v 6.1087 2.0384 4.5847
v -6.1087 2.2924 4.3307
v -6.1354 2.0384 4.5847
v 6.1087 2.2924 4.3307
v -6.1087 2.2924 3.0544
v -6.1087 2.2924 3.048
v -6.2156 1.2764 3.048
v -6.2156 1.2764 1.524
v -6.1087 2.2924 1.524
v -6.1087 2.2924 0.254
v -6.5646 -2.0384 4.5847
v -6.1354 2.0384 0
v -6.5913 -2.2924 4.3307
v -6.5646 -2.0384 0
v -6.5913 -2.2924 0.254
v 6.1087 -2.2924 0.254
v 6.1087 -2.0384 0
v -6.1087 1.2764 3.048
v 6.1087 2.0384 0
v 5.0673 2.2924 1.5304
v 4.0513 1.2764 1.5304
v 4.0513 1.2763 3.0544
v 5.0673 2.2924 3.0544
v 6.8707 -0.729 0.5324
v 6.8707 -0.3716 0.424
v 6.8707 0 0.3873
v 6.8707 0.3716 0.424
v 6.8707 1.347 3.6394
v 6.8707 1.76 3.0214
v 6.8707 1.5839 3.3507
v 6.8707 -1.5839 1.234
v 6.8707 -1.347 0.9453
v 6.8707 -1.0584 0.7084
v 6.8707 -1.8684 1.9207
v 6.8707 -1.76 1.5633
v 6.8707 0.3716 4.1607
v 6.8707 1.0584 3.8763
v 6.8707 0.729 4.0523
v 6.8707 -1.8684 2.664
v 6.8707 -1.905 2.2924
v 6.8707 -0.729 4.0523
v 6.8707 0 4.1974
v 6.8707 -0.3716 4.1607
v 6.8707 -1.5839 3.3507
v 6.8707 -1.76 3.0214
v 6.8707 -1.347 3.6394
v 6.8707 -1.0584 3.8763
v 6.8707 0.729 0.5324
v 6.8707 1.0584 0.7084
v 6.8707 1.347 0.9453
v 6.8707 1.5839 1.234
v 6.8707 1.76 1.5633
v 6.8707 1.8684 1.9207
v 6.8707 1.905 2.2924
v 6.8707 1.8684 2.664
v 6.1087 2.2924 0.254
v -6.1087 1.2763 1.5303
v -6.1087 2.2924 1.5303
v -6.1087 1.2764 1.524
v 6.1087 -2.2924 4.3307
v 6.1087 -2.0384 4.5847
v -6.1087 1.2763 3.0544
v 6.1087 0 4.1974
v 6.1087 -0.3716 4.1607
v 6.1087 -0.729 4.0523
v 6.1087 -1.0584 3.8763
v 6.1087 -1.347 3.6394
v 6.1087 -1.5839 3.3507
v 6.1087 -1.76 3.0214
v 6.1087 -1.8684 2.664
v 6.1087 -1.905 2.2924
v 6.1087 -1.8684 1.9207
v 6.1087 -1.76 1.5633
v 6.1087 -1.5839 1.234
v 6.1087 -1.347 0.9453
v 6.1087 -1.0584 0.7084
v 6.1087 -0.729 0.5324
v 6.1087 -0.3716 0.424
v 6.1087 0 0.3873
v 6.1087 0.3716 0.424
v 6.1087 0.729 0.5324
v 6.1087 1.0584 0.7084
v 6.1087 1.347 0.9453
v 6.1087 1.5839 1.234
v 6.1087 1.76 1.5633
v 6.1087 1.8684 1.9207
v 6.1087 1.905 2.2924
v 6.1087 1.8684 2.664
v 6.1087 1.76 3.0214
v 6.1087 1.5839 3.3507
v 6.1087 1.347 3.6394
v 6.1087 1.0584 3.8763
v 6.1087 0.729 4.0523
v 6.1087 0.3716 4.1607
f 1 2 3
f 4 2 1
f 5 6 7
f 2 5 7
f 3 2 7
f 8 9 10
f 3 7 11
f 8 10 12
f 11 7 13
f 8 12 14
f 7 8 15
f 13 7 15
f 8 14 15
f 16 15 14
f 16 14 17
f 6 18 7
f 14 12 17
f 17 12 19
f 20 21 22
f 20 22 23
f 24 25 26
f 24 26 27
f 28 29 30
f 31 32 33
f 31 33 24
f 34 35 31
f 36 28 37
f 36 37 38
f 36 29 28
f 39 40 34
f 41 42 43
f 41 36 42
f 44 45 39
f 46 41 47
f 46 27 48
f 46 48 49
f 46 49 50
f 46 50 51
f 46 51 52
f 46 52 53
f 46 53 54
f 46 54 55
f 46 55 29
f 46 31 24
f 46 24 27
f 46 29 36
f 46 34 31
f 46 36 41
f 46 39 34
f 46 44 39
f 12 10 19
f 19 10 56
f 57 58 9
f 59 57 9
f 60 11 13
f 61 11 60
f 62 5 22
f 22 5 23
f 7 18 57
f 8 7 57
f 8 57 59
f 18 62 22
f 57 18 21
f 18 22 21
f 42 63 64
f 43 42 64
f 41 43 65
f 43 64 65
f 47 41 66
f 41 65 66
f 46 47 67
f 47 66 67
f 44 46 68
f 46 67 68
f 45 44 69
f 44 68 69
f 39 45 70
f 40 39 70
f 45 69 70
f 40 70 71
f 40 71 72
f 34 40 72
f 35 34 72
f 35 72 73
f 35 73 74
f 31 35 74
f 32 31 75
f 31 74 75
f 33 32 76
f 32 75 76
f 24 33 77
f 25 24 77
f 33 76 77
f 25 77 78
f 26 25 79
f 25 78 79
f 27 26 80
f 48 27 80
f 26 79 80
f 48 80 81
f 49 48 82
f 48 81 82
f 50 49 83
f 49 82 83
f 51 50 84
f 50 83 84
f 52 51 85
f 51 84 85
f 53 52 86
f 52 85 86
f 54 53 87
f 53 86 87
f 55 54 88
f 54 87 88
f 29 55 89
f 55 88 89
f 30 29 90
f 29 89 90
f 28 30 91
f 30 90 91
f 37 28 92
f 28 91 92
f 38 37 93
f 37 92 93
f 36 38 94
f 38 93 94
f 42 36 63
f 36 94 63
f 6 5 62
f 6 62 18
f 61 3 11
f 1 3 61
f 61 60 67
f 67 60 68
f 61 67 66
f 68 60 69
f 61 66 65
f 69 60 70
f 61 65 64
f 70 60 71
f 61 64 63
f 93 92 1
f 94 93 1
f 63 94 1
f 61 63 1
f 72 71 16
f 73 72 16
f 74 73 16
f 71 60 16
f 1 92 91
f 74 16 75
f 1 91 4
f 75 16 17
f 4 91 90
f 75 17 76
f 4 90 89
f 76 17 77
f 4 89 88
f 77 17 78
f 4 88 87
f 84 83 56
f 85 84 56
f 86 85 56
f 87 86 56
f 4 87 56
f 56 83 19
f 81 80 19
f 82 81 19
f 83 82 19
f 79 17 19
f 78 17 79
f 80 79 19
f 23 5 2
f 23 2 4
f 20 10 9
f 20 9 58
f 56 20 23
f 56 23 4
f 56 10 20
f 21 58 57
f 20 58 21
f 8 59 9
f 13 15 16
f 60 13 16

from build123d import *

# Parameters (mm, degrees)
SKETCH1_W           = 12.2174
SKETCH1_H           = 4.5847
BOSS_EXTRUDE1_DEPTH = 4.5847
SKETCH2_W           = 11.176
SKETCH2_H           = 1.524
CUT_EXTRUDE1_DEPTH  = 1.016
SKETCH4_W           = 1.524
SKETCH4_H           = 1.016
CUT_EXTRUDE3_DEPTH  = 14.249120928
SKETCH5_R           = 1.905
BOSS_EXTRUDE3_DEPTH = 0.762
CHAMFER1_SIZE       = 0.254
BOSS_EXTRUDE4_REACH = 9.861


with BuildPart() as part:
    # Sketch1 → Boss-Extrude1 (new body)
    with BuildSketch(Plane.XY):
        Polygon((-6.1087, 2.29235), (-6.5913, -2.29235), (-6.1087, -2.29235), align=None)
        Rectangle(SKETCH1_W, SKETCH1_H)
    extrude(amount=BOSS_EXTRUDE1_DEPTH)

    # Sketch2 → Cut-Extrude1 (cut)
    with BuildSketch(Plane(origin=(0, 2.29235, 0), x_dir=(1, 0, 0), z_dir=(0, 1, 0))):
        with Locations((-0.5207, -2.29235)):
            Rectangle(SKETCH2_W, SKETCH2_H)
    extrude(amount=-CUT_EXTRUDE1_DEPTH, mode=Mode.SUBTRACT)

    # Sketch4 → Cut-Extrude3 (cut, through all)
    with BuildSketch(Plane(origin=(-6.1087, 0, 0), x_dir=(0, 0, -1), z_dir=(1, 0, 0))):
        with Locations((-2.286, 1.78435)):
            Rectangle(SKETCH4_W, SKETCH4_H)
    extrude(amount=-CUT_EXTRUDE3_DEPTH, mode=Mode.SUBTRACT)

    # Sketch5 → Boss-Extrude3 (add)
    with BuildSketch(Plane(origin=(6.1087, 0, 0), x_dir=(0, 0, -1), z_dir=(1, 0, 0))):
        with Locations(Location((-2.29235, 0, 0), (0, 0, 180))):
            Circle(SKETCH5_R)
    extrude(amount=BOSS_EXTRUDE3_DEPTH)

    # Chamfer1
    chamfer1_edges = [part.edges().sort_by_distance(p)[0] for p in [
        (-0.2413, -2.29235, 4.5847),
        (0, 2.29235, 4.5847),
        (0, 2.29235, 0),
        (-0.2413, -2.29235, 0),
    ]]
    chamfer(chamfer1_edges, length=CHAMFER1_SIZE)

    # Sketch6 → Boss-Extrude4 (add, up to next)
    with BuildSketch(Plane.XY.offset(1.53035), mode=Mode.PRIVATE) as boss_extrude4_sk1:
        Polygon((5.0673, 2.29235), (5.0673, 1.27635), (4.0513, 1.27635), align=None)
    boss_extrude4_tool1 = extrude(boss_extrude4_sk1.sketch, amount=BOSS_EXTRUDE4_REACH, mode=Mode.PRIVATE) - part.part
    add(boss_extrude4_tool1.solids().sort_by_distance((4.728633, 1.615017, 1.53035))[0])


solid = part.part
